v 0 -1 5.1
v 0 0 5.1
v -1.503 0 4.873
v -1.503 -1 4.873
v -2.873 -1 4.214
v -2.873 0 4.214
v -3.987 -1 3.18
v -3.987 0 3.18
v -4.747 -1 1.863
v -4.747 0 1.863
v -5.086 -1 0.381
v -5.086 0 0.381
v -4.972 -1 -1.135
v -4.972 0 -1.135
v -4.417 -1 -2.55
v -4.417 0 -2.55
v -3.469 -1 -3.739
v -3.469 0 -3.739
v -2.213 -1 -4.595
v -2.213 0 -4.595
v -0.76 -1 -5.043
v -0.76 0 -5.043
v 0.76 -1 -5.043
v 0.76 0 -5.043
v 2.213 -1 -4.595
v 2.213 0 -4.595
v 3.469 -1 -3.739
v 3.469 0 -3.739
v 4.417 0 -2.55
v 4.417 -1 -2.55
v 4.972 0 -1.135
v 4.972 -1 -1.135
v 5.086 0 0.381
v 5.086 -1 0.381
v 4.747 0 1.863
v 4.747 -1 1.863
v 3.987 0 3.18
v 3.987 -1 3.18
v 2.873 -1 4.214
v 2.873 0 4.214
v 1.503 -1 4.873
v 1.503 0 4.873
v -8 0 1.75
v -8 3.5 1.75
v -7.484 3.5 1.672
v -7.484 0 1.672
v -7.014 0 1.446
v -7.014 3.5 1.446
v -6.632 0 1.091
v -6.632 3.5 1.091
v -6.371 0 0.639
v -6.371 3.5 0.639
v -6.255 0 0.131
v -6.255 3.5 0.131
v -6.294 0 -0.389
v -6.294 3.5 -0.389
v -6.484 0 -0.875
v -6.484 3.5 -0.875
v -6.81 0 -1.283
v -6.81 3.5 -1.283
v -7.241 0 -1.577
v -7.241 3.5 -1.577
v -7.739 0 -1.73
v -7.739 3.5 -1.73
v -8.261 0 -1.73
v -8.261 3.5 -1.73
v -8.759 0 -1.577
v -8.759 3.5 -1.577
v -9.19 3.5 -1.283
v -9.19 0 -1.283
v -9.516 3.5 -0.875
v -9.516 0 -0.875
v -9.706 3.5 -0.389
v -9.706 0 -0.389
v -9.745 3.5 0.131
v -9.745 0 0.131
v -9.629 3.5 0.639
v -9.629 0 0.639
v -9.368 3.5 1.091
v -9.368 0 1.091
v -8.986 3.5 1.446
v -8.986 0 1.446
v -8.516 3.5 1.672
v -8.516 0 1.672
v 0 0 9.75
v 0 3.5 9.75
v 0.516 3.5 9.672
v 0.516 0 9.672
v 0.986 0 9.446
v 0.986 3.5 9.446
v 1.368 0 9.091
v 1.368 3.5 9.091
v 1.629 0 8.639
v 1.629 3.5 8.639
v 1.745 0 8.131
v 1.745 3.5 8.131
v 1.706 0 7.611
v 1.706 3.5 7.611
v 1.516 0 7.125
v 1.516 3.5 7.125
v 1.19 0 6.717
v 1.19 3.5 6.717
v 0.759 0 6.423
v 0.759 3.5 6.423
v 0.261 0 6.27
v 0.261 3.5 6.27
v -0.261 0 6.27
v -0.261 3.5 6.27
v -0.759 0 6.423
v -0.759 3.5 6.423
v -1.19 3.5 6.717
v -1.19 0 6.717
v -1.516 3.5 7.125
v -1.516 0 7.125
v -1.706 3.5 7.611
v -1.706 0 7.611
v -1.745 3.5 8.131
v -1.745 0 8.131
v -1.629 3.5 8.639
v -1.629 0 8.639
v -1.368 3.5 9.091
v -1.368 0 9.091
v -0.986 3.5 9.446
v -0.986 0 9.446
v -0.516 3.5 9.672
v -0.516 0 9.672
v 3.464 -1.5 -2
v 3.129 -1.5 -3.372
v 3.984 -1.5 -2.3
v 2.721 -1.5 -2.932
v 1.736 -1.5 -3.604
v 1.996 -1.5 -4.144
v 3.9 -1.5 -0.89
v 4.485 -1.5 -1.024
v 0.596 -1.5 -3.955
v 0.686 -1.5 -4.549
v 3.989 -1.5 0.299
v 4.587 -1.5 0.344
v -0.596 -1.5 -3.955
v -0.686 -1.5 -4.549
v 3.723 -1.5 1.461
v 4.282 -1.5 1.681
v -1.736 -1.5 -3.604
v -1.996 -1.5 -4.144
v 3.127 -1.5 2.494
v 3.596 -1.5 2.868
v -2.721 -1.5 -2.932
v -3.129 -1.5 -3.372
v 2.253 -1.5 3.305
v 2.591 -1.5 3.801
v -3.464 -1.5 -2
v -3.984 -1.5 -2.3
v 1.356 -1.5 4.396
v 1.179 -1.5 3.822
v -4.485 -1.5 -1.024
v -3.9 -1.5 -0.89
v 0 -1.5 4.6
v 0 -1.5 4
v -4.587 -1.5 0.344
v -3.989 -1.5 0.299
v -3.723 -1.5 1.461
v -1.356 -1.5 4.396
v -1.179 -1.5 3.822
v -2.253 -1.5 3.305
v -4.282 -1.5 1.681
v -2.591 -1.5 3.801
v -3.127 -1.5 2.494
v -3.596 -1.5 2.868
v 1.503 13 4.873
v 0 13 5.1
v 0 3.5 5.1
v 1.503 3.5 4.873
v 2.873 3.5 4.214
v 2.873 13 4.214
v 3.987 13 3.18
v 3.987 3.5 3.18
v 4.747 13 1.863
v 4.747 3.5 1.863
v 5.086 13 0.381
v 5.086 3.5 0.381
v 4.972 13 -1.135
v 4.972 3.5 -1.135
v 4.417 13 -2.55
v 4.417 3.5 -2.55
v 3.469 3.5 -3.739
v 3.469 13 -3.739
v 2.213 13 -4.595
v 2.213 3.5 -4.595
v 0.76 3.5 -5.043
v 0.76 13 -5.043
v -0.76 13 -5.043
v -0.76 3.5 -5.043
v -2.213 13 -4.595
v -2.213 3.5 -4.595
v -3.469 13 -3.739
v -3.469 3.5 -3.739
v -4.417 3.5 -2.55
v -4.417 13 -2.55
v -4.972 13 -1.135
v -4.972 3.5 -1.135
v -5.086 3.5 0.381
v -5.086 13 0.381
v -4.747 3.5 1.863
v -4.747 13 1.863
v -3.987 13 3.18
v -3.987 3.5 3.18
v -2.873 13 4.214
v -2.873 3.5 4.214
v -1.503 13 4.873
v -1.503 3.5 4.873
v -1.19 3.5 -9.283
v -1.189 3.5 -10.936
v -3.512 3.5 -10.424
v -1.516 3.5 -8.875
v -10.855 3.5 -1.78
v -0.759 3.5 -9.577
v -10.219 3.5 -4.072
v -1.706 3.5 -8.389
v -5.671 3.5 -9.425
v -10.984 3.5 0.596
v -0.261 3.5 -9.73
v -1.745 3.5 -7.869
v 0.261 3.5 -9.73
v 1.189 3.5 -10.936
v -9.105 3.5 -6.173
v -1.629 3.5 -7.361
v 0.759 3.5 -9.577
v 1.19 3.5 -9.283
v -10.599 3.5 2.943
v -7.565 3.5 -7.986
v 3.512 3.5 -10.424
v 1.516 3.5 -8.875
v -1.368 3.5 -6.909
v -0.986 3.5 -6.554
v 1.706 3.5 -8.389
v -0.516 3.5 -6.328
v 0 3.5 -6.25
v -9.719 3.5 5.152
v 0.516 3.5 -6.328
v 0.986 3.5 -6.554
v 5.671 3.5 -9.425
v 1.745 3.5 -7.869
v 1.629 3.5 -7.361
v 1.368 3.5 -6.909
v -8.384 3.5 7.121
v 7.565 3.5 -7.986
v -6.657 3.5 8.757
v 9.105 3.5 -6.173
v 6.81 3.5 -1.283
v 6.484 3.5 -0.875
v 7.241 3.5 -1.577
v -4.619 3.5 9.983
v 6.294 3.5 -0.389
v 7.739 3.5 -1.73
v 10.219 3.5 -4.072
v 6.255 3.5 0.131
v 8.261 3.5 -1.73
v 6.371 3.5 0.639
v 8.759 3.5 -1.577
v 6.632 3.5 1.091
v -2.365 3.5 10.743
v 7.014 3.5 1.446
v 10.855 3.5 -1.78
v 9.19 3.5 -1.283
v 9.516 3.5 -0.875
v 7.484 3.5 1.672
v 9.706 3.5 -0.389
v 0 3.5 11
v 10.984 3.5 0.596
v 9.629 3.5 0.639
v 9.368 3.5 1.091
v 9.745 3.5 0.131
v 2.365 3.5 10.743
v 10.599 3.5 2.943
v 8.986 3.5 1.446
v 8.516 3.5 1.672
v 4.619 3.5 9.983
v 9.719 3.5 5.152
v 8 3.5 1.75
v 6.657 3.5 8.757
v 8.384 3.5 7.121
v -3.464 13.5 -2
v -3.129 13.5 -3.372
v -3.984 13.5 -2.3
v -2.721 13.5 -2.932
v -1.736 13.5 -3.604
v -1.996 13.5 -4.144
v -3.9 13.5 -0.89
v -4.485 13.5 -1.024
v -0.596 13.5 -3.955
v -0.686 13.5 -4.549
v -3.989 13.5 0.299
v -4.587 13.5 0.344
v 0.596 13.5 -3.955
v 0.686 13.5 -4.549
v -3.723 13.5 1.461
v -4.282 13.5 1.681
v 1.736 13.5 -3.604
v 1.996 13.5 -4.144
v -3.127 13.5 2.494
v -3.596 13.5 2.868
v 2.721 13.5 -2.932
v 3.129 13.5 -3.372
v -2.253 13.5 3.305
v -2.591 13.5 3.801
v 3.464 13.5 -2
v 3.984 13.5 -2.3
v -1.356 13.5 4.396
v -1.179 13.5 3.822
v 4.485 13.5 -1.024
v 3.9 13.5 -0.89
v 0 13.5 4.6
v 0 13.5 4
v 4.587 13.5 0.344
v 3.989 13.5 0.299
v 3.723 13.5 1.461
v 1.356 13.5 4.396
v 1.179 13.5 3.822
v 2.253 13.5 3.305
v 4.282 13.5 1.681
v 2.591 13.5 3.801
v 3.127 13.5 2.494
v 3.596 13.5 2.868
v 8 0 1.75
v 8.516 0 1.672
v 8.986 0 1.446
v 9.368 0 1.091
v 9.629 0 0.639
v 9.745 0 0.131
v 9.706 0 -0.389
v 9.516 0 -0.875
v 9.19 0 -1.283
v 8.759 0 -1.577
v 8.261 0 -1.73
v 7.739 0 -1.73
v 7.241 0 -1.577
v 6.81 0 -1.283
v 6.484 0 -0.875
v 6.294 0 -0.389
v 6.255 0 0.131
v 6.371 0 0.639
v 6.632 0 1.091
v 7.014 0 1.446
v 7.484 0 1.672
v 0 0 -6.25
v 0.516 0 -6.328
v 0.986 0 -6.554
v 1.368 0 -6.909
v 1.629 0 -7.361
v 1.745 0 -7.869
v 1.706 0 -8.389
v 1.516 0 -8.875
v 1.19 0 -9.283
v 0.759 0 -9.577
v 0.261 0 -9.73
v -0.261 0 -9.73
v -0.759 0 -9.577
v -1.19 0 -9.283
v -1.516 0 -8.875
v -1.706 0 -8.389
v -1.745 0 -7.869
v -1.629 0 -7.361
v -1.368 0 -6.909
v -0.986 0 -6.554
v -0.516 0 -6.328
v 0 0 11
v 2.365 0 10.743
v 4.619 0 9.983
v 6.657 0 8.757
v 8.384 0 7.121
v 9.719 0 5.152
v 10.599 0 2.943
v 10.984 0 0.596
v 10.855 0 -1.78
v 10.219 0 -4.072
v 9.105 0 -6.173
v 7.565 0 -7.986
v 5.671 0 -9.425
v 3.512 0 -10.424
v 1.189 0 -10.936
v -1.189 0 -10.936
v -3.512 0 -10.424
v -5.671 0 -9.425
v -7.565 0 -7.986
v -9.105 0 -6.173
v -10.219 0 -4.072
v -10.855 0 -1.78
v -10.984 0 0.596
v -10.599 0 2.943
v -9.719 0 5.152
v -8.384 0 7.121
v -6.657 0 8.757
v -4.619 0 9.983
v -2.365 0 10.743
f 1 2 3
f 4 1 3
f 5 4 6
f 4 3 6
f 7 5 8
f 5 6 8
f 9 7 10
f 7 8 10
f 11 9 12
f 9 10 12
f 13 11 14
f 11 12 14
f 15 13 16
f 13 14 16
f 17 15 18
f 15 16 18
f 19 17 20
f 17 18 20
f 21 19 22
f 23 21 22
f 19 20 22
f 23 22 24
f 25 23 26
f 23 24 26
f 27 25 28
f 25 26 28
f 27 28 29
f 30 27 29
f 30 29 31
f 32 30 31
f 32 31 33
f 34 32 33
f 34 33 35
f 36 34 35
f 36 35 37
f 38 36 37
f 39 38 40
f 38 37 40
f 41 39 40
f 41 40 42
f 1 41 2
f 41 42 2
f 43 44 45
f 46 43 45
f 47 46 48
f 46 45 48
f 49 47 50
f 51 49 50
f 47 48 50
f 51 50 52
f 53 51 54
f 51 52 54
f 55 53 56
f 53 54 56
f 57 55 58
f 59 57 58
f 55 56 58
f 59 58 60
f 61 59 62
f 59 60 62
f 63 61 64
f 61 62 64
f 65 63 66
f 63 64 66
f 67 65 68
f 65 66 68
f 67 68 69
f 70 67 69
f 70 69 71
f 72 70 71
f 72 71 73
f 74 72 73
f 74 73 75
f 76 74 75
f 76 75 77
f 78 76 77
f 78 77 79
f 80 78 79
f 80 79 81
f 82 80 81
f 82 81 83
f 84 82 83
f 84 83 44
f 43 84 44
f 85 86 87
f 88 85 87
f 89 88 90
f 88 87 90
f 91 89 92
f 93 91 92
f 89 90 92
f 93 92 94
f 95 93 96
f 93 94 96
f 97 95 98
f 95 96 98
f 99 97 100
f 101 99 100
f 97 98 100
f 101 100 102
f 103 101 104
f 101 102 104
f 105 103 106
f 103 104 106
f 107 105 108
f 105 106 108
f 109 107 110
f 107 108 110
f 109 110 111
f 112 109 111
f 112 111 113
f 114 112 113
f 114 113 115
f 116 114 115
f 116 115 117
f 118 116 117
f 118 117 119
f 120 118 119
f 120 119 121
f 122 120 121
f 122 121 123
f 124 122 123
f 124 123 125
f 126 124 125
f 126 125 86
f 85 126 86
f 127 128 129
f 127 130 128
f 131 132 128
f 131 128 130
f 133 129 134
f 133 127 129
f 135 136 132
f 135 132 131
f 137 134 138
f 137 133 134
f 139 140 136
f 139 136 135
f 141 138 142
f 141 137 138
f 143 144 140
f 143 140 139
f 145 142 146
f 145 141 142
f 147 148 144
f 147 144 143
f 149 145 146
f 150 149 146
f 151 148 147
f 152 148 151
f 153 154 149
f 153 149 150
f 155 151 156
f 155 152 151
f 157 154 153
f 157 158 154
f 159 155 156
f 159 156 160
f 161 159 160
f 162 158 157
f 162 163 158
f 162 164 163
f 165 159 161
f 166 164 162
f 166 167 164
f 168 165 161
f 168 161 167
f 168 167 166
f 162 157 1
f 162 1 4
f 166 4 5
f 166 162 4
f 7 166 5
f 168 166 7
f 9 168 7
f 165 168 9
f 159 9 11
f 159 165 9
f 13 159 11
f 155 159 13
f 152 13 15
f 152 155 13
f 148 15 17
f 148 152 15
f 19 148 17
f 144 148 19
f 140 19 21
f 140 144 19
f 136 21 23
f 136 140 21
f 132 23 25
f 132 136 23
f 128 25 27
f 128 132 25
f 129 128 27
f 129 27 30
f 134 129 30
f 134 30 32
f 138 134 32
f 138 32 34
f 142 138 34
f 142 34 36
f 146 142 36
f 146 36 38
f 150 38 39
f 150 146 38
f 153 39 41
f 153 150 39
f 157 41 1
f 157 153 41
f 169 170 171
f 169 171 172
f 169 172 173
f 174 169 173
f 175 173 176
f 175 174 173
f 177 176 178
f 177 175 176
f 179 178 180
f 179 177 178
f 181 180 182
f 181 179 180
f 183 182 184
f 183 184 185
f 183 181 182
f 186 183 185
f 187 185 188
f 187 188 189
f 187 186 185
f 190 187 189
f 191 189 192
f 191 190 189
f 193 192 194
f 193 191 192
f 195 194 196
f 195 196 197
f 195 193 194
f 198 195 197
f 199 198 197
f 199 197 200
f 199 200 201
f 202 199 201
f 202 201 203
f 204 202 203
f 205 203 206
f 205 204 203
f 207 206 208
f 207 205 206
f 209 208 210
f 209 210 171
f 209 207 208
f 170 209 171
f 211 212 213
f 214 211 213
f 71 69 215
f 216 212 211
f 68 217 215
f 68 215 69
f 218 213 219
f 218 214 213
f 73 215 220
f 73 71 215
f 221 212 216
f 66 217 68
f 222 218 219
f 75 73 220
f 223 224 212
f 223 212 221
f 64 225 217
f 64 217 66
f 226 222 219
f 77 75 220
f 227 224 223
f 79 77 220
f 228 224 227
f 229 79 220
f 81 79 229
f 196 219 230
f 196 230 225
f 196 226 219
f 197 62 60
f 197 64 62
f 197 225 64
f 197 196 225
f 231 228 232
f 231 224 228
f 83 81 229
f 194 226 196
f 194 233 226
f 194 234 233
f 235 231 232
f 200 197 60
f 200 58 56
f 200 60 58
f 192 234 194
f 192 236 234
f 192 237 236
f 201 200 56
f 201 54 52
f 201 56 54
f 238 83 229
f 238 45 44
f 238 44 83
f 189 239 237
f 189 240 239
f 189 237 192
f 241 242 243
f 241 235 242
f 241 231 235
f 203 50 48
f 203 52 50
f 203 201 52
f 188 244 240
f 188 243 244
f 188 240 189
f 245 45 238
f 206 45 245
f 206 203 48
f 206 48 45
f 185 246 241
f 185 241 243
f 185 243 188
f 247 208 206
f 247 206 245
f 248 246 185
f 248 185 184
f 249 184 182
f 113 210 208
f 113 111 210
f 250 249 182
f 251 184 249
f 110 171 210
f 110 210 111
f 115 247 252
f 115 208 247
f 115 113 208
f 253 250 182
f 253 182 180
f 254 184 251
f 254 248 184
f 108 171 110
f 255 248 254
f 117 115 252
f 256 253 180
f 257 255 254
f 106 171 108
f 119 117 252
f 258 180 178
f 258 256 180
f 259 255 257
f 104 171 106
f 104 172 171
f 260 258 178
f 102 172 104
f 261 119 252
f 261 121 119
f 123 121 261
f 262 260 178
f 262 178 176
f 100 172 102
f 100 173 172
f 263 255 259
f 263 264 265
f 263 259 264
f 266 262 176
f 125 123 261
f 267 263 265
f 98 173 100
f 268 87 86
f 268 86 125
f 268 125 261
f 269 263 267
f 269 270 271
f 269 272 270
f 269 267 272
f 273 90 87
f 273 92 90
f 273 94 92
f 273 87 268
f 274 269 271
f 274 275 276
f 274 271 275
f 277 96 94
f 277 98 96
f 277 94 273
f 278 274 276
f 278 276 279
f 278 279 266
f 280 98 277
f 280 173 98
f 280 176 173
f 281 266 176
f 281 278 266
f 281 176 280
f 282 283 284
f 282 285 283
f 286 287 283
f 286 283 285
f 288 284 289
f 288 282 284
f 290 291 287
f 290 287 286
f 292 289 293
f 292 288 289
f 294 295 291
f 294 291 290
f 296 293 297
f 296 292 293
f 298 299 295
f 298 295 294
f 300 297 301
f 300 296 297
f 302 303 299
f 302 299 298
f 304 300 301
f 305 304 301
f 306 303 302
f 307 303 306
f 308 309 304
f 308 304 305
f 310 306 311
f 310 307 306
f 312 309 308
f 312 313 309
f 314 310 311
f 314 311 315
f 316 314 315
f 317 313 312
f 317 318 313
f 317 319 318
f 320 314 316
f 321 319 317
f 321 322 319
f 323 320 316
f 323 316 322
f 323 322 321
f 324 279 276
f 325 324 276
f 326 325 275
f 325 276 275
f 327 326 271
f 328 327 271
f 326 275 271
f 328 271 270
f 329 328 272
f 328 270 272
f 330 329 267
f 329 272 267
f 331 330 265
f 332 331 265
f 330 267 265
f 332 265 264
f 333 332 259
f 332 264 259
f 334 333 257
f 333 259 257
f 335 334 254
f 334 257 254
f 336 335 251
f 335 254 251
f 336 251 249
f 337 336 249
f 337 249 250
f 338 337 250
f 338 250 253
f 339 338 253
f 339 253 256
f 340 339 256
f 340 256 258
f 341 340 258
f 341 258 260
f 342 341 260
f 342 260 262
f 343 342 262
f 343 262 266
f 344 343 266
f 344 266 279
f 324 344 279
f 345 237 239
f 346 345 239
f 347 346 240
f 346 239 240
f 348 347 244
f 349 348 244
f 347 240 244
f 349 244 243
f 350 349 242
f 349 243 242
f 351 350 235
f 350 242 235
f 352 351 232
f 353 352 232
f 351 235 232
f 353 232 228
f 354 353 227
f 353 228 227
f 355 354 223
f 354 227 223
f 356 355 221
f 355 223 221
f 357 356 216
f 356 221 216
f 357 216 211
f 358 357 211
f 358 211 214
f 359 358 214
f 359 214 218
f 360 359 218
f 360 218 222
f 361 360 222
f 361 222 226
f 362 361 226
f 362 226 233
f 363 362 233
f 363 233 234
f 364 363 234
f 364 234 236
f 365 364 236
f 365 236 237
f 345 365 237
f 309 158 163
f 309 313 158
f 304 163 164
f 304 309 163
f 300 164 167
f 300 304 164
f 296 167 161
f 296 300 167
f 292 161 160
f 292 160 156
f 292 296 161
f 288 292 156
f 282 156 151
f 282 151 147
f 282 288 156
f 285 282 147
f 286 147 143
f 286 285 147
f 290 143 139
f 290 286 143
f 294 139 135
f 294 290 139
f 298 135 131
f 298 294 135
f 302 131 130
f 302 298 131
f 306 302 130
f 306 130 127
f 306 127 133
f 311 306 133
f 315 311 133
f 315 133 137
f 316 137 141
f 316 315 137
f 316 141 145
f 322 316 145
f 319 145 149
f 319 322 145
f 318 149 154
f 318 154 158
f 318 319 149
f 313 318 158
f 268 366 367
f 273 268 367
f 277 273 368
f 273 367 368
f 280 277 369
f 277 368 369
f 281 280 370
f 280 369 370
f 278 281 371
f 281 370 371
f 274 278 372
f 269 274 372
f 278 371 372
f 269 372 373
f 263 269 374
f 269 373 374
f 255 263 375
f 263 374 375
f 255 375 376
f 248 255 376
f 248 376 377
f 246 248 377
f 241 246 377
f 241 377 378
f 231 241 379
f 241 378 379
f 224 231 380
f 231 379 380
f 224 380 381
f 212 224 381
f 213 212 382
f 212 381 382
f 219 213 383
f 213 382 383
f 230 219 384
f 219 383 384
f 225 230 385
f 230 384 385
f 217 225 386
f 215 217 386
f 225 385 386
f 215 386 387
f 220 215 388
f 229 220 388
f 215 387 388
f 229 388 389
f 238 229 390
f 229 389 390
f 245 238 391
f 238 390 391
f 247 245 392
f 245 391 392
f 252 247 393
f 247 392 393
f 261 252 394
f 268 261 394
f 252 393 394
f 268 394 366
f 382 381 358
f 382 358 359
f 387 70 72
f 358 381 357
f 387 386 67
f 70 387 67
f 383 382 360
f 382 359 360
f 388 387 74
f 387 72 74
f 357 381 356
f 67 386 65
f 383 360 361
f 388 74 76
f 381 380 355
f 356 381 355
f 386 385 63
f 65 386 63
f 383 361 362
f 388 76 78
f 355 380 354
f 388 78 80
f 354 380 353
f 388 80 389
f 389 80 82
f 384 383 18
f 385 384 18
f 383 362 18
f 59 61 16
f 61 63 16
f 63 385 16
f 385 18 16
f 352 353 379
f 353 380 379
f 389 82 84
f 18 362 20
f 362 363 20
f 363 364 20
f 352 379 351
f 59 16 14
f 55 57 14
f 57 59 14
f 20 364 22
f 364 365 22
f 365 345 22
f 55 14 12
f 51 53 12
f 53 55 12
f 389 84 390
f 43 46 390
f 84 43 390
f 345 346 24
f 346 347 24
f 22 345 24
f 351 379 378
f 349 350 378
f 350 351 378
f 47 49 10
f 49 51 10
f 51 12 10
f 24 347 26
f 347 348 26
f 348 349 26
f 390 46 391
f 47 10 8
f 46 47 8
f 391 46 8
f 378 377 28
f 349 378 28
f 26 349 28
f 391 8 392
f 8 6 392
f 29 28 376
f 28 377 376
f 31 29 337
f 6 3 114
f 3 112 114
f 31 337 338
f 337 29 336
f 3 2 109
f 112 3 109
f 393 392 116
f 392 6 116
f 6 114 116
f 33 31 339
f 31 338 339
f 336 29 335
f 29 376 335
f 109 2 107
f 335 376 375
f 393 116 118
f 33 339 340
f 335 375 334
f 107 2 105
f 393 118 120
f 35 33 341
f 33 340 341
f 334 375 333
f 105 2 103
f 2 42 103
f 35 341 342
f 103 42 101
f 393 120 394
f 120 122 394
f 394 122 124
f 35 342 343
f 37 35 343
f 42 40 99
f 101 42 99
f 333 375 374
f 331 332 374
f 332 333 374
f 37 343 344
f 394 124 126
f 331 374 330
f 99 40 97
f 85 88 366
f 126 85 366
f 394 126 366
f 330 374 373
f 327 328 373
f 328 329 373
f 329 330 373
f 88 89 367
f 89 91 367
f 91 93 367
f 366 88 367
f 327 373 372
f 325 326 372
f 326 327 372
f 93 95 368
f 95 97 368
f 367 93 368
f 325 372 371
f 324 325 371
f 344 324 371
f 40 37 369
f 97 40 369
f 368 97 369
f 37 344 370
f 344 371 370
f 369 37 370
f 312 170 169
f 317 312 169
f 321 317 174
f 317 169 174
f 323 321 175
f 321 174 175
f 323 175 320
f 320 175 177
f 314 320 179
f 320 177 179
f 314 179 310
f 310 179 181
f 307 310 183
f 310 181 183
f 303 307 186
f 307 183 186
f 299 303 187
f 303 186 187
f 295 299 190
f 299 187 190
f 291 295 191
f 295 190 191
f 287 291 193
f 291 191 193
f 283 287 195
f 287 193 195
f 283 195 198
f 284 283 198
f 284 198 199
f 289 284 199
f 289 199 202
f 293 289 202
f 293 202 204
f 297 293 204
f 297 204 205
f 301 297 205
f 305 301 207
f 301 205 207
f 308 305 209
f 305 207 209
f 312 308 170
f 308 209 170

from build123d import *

# Parameters (mm, degrees)
SKETCH_1_R          = 11
EXTRUDE_1_DEPTH     = 3.5
SKETCH_2_R          = 4
CUT_EXTRUDE_1_DEPTH = 16.945218719
EXTRUDE_START       = 10
SKETCH_3_R          = 5.1
SKETCH_3_R_2        = 4
EXTRUDE_2_DEPTH     = 10
SKETCH_6_R          = 5.1
SKETCH_6_R_2        = 4
EXTRUDE_3_DEPTH     = 1.5
SKETCH_7_R          = 1.75
CUT_EXTRUDE_2_DEPTH = 19.493242009
CHAMFER_1_SIZE      = 0.5


with BuildPart() as part:
    # 草图1 → 凸台-拉伸1 (new body)
    with BuildSketch(Plane(origin=(0, 0, 0), x_dir=(1, 0, 0), z_dir=(0, 1, 0))):
        with Locations(Location((0, 0, 0), (0, 0, 270))):
            Circle(SKETCH_1_R)
    extrude(amount=EXTRUDE_1_DEPTH)

    # 草图2 → 切除-拉伸1 (cut, through all)
    with BuildSketch(Plane(origin=(0, 3.5, 0), x_dir=(1, 0, 0), z_dir=(0, 1, 0))):
        with Locations(Location((0, 0, 0), (0, 0, 270))):
            Circle(SKETCH_2_R)
    extrude(amount=-CUT_EXTRUDE_1_DEPTH, mode=Mode.SUBTRACT)

    # 草图3 → 凸台-拉伸2 (add)
    with BuildSketch(Plane(origin=(0, 3.5, 0), x_dir=(1, 0, 0), z_dir=(0, 1, 0)).offset(EXTRUDE_START)):
        with Locations(Location((0, 0, 0), (0, 0, 270))):
            Circle(SKETCH_3_R)
        with Locations(Location((0, 0, 0), (0, 0, 270))):
            Circle(SKETCH_3_R_2, mode=Mode.SUBTRACT)
    extrude(amount=-EXTRUDE_2_DEPTH)

    # 草图6 → 凸台-拉伸3 (add)
    with BuildSketch(Plane.XZ):
        with Locations(Location((0, 0, 0), (0, 0, 90))):
            Circle(SKETCH_6_R)
        with Locations(Location((0, 0, 0), (0, 0, 90))):
            Circle(SKETCH_6_R_2, mode=Mode.SUBTRACT)
    extrude(amount=EXTRUDE_3_DEPTH)

    # 草图7 → 切除-拉伸2 (cut, through all)
    with BuildSketch(Plane(origin=(0, 3.5, 0), x_dir=(1, 0, 0), z_dir=(0, 1, 0))):
        with Locations(Location((0, 8, 0), (0, 0, 270))):
            Circle(SKETCH_7_R)
        with Locations(Location((8, 0, 0), (0, 0, 270))):
            Circle(SKETCH_7_R)
        with Locations(Location((0, -8, 0), (0, 0, 270))):
            Circle(SKETCH_7_R)
        with Locations(Location((-8, 0, 0), (0, 0, 270))):
            Circle(SKETCH_7_R)
    extrude(amount=-CUT_EXTRUDE_2_DEPTH, mode=Mode.SUBTRACT)

    # 倒角1
    chamfer_1_edges = [part.edges().sort_by_distance(p)[0] for p in [
        (0, 13.5, -5.1),
        (0, -1.5, -5.1),
    ]]
    chamfer(chamfer_1_edges, length=CHAMFER_1_SIZE)


solid = part.part
